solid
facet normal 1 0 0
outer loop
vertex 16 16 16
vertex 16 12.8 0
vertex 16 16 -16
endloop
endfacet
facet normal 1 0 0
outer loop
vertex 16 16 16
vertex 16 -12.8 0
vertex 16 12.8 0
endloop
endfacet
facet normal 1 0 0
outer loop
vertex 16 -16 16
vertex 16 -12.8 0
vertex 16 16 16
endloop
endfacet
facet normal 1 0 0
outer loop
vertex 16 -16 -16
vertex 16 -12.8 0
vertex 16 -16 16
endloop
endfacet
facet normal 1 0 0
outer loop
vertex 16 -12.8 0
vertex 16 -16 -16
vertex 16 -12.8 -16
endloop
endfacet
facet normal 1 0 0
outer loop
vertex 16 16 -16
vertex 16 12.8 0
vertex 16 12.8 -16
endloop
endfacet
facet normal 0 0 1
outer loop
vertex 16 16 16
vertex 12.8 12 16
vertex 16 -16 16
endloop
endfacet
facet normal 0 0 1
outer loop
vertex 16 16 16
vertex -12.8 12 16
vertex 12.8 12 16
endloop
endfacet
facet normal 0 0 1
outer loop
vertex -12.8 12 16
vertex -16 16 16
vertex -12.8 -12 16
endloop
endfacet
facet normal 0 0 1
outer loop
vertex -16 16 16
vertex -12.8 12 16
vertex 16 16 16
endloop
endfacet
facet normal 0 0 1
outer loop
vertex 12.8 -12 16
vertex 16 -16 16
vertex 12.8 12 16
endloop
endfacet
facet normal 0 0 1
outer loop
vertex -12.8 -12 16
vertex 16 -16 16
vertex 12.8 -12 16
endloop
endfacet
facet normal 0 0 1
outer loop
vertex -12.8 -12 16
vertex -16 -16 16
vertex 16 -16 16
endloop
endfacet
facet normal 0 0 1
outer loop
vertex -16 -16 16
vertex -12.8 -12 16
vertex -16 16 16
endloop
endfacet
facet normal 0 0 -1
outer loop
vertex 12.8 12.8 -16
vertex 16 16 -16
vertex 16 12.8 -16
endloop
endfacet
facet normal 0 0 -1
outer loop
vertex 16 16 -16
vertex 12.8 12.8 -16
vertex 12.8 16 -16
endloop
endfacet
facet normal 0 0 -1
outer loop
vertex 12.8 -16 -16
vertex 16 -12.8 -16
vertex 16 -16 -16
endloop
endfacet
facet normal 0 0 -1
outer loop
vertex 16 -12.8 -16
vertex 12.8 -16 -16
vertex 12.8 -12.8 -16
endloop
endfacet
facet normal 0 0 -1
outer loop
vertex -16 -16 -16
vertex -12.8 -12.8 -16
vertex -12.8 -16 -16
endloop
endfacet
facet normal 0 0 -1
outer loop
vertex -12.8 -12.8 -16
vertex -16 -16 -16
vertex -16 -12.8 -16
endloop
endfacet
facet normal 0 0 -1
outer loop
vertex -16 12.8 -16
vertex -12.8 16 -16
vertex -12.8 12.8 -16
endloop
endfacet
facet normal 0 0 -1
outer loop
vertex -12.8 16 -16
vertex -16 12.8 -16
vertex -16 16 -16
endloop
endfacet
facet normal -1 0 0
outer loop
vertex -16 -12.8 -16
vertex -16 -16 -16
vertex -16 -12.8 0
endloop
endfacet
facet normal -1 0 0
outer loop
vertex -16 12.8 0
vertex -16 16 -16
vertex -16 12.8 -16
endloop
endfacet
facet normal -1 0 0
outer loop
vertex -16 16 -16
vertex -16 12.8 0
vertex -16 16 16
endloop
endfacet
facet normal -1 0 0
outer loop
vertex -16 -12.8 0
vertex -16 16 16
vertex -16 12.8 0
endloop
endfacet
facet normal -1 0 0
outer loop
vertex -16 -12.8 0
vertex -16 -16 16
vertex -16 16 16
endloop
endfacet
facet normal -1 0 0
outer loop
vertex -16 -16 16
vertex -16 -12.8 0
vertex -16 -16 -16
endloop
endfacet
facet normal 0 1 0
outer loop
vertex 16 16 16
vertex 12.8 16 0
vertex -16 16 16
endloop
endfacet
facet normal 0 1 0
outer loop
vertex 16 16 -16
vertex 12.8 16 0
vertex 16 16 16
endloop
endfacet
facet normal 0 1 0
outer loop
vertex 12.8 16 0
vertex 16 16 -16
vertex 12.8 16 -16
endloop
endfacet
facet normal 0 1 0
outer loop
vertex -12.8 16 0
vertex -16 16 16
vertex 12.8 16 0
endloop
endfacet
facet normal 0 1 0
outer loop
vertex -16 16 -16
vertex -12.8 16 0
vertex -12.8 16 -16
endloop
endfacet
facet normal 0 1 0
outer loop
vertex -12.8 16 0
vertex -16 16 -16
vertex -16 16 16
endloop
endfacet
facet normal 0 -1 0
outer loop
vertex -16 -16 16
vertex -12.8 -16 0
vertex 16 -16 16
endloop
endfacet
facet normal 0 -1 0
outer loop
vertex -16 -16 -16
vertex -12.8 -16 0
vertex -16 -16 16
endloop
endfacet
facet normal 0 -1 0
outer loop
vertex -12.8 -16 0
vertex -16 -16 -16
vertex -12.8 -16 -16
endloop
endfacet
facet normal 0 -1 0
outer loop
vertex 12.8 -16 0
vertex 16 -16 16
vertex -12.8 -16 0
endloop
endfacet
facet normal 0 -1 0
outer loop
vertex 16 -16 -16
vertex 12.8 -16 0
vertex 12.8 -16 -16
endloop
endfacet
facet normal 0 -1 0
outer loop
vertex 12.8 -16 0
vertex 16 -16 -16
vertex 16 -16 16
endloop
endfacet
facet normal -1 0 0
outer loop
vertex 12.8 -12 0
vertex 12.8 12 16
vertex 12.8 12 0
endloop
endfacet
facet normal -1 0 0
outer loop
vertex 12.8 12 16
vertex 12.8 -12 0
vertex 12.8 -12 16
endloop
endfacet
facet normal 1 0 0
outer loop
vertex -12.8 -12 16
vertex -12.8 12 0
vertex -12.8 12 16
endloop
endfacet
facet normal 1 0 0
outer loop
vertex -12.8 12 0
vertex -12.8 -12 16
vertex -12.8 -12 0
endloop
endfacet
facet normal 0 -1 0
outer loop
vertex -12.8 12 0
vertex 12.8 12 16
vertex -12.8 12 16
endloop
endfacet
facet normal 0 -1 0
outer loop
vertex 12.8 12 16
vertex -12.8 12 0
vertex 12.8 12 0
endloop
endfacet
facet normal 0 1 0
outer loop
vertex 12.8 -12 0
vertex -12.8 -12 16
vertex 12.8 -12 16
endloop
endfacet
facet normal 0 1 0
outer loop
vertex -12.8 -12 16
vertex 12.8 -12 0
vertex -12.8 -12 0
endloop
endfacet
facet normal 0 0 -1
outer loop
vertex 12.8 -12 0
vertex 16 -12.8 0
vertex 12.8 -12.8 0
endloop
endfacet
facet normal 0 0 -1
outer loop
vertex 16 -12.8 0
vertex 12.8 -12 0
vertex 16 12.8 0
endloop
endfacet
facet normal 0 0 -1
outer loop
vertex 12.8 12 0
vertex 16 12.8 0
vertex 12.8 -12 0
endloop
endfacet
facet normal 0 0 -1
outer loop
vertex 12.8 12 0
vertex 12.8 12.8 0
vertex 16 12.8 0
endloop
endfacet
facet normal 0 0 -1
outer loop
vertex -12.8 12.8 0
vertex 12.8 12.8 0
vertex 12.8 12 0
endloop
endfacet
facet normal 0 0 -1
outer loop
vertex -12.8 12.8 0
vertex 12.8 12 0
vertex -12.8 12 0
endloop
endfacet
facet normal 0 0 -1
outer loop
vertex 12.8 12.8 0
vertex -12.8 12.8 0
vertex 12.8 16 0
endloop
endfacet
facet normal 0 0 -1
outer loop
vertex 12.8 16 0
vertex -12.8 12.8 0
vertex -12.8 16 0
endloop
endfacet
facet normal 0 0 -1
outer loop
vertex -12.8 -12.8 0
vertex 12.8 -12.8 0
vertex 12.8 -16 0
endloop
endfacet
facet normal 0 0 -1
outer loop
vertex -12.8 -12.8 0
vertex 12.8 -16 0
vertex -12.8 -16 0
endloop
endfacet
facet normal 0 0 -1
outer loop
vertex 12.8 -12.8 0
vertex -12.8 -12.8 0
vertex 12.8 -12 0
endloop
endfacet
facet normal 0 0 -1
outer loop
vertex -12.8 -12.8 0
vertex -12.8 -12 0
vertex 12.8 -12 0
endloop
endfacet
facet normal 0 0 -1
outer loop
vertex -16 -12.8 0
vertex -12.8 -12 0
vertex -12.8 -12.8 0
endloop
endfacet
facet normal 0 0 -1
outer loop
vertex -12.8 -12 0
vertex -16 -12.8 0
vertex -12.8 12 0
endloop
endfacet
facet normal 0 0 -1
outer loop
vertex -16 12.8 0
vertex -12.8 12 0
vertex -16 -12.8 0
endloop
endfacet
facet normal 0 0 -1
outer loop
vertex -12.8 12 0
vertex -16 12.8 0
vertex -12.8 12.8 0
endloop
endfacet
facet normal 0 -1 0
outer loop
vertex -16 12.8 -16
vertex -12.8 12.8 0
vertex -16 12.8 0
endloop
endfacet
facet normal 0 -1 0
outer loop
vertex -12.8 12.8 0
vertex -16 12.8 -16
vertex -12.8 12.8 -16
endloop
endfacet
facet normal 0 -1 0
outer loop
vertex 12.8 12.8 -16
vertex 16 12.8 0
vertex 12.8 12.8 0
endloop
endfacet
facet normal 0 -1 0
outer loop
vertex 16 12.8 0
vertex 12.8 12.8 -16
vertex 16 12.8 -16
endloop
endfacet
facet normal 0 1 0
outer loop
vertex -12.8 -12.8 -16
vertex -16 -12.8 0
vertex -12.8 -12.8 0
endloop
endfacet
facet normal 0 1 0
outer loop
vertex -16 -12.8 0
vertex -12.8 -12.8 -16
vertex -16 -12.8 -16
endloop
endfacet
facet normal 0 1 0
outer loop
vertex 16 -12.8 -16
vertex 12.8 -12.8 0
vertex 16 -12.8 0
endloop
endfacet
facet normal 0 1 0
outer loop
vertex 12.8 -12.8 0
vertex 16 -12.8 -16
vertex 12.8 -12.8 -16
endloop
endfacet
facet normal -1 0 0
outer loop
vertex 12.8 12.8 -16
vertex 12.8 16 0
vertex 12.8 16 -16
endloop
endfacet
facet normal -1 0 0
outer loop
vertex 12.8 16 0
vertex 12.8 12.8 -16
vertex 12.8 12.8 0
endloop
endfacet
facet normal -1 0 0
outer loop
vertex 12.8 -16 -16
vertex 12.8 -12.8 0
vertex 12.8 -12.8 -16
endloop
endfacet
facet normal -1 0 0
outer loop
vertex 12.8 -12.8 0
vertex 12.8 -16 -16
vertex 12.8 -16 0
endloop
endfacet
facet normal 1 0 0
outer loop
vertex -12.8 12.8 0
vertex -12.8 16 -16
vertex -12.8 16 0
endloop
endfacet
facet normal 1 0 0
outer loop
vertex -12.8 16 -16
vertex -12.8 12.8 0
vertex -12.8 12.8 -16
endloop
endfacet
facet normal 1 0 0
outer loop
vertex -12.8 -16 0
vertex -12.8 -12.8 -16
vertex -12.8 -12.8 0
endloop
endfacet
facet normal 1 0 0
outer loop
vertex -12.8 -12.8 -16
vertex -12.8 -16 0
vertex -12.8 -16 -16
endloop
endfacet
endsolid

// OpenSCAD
size = 32;//block=32 //item=8

difference() {
  cube([size, size, size], center = true);
  translate([0, 0, size * 0.40]) {
    cube([size * 0.8, size * 0.75, size * 1.25], center = true);
  }
  ;//translate
  translate([0, 0, -size * 0.30]) {
    cube([size * 1.25, size * 0.8, size * 0.6], center = true);
  }
  ;//translate
  translate([0, 0, -size * 0.30]) {
    cube([size * 0.8, size * 1.25, size * 0.6], center = true);
  }
  ;//translate
}
;//difference
